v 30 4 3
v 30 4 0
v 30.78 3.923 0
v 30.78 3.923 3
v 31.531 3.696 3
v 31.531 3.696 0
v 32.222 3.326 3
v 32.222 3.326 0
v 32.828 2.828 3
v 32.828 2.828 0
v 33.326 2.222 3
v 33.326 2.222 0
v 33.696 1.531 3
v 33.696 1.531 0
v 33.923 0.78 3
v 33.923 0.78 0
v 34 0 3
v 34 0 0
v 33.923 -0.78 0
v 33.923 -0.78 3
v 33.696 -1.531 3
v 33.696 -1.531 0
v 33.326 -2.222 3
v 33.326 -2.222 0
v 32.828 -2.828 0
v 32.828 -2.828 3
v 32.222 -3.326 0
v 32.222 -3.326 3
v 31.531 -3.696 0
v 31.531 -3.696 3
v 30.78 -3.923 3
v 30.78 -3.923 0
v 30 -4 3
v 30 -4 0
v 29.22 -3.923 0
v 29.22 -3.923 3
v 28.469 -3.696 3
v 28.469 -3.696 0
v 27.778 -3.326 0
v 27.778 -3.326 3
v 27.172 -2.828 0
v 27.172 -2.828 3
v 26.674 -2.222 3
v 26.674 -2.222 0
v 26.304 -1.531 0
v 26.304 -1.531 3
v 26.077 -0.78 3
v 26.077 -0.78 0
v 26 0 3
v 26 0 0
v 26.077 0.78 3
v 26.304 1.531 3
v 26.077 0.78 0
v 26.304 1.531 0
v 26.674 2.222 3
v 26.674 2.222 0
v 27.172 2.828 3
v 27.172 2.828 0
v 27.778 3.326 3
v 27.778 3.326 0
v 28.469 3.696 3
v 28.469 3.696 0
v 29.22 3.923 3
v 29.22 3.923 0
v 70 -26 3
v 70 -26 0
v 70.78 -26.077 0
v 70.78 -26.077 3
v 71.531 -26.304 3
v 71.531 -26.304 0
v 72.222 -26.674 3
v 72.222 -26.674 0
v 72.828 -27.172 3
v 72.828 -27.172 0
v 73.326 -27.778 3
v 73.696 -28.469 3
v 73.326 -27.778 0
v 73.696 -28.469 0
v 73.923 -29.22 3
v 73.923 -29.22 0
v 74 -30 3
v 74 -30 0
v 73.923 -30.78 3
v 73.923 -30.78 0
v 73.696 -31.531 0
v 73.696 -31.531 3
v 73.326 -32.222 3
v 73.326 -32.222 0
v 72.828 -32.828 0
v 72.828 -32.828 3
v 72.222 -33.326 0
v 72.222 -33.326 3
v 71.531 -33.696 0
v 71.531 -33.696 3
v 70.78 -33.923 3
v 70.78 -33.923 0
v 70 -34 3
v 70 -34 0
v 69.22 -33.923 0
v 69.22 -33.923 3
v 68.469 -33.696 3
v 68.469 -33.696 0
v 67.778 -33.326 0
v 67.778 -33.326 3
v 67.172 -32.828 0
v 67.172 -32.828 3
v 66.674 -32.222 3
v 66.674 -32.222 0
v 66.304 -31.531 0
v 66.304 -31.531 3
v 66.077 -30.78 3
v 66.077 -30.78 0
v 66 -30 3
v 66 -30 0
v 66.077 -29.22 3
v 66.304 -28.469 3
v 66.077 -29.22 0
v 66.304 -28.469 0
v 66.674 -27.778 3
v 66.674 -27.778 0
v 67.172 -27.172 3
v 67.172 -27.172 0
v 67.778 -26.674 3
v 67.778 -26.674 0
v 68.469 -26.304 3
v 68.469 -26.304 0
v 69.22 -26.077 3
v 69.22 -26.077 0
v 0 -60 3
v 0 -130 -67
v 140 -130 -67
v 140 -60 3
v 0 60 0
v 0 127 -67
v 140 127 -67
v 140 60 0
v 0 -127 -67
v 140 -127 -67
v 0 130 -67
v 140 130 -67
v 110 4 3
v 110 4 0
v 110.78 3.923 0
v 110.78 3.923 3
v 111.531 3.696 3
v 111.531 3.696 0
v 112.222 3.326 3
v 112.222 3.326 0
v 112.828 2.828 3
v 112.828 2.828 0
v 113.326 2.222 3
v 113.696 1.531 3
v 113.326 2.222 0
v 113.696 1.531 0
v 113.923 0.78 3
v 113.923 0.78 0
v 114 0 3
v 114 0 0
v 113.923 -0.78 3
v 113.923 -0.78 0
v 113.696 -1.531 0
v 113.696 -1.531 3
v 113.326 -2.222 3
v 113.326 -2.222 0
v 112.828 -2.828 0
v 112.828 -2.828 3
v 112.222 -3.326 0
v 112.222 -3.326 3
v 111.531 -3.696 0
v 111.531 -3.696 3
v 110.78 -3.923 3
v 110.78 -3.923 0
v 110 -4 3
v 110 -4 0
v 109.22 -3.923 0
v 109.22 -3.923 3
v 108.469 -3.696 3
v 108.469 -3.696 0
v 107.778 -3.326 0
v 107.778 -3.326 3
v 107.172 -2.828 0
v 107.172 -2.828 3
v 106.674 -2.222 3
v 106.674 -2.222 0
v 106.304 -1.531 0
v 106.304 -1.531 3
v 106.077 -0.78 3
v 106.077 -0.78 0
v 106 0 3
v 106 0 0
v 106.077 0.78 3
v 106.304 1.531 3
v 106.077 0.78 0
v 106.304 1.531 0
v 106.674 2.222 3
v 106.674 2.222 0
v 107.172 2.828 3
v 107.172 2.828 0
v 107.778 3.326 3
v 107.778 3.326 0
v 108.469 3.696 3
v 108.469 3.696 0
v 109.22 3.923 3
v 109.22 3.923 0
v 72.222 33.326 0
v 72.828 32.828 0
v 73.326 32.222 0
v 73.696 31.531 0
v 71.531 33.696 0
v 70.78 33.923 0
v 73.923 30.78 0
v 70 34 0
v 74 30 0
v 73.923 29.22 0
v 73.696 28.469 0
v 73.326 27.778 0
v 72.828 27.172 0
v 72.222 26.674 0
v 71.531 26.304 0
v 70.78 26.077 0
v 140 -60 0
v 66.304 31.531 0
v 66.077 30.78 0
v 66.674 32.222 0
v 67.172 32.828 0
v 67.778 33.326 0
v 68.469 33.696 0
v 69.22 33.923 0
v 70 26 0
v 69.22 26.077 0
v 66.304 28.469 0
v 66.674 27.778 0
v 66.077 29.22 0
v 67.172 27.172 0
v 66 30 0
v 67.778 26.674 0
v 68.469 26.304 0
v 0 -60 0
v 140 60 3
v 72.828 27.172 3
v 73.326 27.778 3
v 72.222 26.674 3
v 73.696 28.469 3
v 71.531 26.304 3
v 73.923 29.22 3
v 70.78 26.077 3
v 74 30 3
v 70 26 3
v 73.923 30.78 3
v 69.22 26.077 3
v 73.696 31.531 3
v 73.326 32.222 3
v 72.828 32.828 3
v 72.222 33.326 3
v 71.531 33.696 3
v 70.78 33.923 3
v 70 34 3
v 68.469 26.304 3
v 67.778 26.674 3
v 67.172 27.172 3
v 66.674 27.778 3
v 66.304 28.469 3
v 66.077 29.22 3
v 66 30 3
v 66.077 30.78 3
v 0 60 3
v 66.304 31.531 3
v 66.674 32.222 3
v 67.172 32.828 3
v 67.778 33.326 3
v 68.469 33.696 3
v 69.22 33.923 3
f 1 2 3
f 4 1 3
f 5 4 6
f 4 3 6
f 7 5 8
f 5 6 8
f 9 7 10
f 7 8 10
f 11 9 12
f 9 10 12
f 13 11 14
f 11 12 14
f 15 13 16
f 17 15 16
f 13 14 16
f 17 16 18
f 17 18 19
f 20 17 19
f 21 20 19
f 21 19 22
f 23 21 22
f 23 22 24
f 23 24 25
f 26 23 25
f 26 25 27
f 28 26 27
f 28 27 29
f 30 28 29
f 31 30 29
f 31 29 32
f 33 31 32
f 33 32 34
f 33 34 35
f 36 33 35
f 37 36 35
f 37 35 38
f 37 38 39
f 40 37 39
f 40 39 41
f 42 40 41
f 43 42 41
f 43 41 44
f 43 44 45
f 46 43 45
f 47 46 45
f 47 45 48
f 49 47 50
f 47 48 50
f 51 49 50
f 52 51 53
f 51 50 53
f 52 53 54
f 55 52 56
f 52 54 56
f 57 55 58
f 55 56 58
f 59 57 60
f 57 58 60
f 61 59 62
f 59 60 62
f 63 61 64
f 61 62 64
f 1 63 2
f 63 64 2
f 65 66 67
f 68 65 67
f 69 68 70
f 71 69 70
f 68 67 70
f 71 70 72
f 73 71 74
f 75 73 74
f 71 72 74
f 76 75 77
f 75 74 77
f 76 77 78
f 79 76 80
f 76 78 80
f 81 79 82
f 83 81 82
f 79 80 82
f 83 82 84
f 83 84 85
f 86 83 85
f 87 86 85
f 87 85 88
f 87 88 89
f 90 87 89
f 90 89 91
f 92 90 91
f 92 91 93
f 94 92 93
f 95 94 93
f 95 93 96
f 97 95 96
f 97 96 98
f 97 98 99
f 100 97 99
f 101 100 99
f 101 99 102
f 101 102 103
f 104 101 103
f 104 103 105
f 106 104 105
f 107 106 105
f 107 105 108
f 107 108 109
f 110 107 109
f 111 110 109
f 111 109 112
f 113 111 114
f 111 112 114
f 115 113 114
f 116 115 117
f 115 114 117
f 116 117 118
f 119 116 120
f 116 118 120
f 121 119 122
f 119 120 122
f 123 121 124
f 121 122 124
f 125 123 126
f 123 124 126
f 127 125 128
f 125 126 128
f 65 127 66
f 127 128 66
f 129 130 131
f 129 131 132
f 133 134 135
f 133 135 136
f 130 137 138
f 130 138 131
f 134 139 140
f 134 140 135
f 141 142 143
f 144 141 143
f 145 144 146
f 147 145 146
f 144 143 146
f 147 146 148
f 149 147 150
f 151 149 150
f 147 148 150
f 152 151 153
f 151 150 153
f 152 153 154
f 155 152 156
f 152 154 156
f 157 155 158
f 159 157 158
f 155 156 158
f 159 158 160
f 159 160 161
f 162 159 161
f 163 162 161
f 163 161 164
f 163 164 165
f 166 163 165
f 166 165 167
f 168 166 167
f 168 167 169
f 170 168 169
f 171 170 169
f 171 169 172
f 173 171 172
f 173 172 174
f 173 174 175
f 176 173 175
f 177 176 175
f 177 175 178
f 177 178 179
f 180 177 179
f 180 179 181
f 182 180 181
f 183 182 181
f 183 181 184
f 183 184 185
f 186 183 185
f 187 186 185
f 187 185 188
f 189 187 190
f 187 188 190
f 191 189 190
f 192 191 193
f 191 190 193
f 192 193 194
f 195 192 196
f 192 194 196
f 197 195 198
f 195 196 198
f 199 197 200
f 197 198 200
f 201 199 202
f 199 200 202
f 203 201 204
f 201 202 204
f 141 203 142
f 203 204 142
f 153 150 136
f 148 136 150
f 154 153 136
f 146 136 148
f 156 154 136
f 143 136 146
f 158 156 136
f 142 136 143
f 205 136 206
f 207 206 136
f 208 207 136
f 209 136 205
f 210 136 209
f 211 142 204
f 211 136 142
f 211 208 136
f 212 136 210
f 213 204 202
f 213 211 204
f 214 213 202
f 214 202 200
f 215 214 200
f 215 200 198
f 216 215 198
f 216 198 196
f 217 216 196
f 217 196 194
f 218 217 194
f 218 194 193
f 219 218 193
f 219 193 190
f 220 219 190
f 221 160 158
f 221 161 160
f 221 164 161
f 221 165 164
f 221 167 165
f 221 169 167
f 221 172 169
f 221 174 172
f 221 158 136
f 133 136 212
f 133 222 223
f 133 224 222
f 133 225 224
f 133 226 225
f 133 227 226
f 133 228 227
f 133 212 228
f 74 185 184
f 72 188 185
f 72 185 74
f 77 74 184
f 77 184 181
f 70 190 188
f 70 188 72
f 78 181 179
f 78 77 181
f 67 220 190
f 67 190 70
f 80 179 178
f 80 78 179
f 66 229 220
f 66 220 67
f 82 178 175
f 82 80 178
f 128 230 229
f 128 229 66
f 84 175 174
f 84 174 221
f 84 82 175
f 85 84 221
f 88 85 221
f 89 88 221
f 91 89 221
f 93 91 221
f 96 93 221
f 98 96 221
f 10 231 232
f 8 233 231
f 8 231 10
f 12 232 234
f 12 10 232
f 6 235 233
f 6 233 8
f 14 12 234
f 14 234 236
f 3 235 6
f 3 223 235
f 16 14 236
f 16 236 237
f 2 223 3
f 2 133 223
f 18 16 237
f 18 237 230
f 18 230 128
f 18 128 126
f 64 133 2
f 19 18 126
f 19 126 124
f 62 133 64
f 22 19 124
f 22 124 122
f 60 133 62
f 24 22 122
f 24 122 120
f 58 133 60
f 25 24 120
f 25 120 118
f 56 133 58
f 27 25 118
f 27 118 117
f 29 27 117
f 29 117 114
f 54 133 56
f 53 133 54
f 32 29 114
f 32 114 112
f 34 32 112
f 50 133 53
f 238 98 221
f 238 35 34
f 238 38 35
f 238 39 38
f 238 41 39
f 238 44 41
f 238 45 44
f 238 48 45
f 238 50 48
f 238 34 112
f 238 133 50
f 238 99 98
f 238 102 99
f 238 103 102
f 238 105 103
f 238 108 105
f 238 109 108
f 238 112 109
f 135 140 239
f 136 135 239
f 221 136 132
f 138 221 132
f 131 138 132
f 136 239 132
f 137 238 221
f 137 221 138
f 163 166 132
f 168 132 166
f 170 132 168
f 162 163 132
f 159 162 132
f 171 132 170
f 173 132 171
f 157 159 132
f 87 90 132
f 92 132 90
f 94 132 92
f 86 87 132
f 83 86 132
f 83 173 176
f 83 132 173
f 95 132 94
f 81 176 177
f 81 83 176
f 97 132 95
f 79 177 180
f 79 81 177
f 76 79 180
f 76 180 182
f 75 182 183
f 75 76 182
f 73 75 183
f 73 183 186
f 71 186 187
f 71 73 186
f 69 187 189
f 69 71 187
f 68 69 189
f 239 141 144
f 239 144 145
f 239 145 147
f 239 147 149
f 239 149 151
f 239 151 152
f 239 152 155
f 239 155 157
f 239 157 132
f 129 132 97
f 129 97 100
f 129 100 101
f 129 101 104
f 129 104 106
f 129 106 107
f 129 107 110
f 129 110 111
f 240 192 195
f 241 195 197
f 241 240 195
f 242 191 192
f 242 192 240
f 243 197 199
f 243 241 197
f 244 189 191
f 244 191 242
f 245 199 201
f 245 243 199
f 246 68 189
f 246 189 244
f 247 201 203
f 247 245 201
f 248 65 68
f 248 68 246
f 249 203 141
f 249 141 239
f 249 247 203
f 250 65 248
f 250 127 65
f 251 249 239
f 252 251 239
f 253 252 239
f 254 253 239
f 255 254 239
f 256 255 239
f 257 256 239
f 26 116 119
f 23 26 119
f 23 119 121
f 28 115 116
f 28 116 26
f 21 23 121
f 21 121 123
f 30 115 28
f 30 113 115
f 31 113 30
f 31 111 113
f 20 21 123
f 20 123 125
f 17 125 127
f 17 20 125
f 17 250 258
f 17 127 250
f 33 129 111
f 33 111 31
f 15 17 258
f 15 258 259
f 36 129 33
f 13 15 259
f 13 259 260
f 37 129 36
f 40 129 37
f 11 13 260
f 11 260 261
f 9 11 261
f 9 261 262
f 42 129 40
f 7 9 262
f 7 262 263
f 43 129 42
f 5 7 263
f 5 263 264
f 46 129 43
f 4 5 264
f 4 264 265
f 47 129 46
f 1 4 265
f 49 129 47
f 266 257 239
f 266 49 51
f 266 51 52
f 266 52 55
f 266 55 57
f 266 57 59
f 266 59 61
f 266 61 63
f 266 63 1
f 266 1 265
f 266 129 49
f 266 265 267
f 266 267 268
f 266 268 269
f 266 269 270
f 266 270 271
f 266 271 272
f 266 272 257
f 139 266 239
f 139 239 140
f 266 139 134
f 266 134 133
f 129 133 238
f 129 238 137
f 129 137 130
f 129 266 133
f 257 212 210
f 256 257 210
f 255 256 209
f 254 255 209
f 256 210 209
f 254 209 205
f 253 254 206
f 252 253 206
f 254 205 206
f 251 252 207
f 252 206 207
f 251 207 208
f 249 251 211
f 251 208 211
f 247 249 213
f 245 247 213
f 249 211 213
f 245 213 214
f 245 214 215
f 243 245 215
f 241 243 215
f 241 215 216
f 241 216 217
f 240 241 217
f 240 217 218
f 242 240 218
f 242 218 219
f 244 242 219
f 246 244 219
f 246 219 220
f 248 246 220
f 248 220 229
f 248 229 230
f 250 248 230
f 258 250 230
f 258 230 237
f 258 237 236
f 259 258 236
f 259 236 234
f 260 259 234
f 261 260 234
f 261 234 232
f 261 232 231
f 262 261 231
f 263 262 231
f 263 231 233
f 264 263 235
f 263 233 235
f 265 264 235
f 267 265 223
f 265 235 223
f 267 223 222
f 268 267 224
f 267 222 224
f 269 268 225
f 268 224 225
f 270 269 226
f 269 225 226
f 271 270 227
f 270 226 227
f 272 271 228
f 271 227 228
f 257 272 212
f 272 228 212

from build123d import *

# Parameters (mm, degrees)
BOSS_EXTRUDE1_DEPTH = 140
SKETCH2_R           = 4
CUT_EXTRUDE1_DEPTH  = 10


with BuildPart() as part:
    # Sketch1 → Boss-Extrude1 (new body)
    with BuildSketch(Plane.YZ):
        Polygon((60, 0), (-60, 0), (-127, -67), (-130, -67), (-60, 3), (60, 3), (130, -67), (127, -67), align=None)
    extrude(amount=BOSS_EXTRUDE1_DEPTH)

    # Sketch2 → Cut-Extrude1 (cut)
    with BuildSketch(Plane(origin=(0, 0, 0), x_dir=(1, 0, 0), z_dir=(0, 0, -1))):
        with Locations(Location((30, 0, 0), (0, 0, 270))):
            Circle(SKETCH2_R)
        with Locations(Location((110, 0, 0), (0, 0, 270))):
            Circle(SKETCH2_R)
        with Locations(Location((70, 30, 0), (0, 0, 270))):
            Circle(SKETCH2_R)
        with Locations(Location((70, -30, 0), (0, 0, 270))):
            Circle(SKETCH2_R)
    extrude(amount=-CUT_EXTRUDE1_DEPTH, mode=Mode.SUBTRACT)


solid = part.part
